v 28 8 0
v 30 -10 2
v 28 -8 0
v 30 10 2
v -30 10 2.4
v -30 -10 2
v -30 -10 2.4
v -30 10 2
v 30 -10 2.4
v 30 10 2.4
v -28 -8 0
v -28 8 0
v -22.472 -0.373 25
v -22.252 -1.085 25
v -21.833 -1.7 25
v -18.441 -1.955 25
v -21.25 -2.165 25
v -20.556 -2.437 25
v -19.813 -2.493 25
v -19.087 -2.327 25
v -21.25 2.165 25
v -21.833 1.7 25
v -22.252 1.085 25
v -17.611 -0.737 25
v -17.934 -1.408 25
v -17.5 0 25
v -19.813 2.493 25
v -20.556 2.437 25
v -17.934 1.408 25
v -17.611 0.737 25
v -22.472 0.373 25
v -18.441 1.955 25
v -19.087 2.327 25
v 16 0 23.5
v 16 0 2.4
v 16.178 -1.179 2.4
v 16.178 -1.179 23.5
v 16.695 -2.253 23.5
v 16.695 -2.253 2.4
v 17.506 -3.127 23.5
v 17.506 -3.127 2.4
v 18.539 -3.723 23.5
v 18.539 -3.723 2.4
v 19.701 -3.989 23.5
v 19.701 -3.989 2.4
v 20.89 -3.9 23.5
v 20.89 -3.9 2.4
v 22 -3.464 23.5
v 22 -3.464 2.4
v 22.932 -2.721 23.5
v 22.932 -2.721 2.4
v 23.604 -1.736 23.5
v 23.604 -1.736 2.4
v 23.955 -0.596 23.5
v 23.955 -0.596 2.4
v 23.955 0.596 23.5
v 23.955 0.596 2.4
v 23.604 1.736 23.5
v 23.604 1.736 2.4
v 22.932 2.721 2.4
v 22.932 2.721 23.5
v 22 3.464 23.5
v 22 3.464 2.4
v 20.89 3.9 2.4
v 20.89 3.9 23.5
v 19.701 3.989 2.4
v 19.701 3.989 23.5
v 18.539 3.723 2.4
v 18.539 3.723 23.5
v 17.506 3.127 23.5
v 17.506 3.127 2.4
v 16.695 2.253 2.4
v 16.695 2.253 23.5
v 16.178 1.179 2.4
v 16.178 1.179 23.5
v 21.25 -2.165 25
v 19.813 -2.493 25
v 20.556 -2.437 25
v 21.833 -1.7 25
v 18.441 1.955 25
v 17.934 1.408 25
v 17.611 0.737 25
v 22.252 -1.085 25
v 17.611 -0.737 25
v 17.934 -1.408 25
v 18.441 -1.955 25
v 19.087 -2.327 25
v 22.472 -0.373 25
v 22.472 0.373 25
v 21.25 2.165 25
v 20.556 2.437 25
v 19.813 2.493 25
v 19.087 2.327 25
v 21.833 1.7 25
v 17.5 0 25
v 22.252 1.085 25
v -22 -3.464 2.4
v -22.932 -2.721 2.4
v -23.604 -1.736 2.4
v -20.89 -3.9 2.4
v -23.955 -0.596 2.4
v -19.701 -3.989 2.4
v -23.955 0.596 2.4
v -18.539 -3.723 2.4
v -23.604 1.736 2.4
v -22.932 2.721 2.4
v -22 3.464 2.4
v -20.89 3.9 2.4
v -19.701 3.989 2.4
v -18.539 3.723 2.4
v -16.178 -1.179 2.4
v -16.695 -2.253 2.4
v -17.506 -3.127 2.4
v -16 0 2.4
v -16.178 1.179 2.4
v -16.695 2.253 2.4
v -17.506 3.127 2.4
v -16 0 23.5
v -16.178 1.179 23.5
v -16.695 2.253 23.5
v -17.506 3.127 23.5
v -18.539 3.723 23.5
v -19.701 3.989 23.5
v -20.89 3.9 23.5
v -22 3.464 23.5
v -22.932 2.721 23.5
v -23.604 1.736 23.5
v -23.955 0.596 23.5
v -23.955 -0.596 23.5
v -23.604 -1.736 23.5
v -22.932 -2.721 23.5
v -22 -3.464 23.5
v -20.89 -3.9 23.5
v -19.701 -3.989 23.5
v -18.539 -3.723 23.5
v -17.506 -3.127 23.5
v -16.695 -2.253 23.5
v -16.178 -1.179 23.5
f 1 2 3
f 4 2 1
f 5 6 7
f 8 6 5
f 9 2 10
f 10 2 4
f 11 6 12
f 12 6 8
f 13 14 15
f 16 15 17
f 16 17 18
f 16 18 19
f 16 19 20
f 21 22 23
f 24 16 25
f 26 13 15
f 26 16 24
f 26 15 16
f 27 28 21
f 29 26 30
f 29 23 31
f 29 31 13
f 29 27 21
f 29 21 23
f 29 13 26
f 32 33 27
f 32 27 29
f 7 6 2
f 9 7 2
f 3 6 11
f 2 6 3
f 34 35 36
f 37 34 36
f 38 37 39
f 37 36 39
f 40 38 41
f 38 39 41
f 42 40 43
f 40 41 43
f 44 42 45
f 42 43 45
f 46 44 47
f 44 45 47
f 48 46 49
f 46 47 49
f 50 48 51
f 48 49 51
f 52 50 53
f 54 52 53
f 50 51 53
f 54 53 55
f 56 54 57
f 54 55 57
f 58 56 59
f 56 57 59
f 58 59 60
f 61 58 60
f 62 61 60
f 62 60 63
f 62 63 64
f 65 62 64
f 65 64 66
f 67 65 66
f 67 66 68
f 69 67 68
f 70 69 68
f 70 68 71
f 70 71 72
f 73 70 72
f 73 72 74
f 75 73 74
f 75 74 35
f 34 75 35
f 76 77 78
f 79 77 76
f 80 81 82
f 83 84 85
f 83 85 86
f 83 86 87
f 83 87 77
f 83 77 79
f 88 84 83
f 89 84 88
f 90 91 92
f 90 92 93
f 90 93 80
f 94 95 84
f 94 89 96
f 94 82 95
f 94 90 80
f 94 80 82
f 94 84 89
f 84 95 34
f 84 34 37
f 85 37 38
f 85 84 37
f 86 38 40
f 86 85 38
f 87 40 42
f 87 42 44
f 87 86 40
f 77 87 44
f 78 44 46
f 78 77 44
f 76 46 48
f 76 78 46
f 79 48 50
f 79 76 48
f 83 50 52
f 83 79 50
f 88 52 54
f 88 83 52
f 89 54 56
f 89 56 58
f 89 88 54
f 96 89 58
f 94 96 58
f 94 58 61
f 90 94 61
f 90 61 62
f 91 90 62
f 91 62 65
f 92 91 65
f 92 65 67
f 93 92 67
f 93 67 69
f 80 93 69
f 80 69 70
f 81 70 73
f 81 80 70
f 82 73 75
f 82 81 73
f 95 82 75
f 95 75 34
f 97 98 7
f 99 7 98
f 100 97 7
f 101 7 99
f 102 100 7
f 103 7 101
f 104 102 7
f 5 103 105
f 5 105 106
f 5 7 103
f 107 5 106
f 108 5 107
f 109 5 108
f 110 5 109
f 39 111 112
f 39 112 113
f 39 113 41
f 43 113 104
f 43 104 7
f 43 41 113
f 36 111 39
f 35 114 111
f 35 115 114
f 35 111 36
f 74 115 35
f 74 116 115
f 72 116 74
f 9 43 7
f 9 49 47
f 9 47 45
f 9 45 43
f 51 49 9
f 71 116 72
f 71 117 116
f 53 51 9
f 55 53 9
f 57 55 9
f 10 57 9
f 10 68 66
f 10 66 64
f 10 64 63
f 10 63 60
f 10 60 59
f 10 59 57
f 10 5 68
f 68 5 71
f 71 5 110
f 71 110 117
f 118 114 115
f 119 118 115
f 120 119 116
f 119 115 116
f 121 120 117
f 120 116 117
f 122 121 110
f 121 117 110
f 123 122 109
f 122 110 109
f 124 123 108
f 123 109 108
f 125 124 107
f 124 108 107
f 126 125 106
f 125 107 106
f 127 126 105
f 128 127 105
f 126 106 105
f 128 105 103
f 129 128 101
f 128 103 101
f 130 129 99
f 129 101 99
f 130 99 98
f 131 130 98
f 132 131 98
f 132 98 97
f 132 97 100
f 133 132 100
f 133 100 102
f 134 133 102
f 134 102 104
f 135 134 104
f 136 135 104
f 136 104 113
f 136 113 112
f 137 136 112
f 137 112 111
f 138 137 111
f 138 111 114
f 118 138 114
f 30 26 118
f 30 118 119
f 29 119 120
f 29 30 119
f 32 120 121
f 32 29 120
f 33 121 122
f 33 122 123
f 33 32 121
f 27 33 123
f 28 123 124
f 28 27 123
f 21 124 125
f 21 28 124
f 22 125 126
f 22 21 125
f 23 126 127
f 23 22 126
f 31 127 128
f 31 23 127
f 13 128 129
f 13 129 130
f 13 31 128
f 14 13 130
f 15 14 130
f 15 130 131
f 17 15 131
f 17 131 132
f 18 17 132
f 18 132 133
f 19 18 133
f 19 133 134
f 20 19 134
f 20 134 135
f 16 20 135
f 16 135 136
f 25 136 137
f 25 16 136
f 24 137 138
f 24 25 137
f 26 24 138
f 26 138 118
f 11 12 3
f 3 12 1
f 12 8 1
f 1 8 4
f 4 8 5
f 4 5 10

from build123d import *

# Parameters (mm, degrees)
F0_W     = 60
F0_H     = 20
F0_R     = 4
F1_DEPTH = 2.4
F2_DEPTH = 25
F3_SIZE  = 2
F4_SIZE  = 1.5


with BuildPart() as f1:
    # F0 (on Top) → F1 (new body)
    with BuildSketch(Plane.XY):
        Rectangle(F0_W, F0_H)
        with Locations((-20, 0)):
            Circle(F0_R, mode=Mode.SUBTRACT)
        with BuildLine():
            ThreePointArc((24, 0), (20, -4), (16, 0))
            ThreePointArc((16, 0), (20, 4), (24, 0))
        make_face(mode=Mode.SUBTRACT)
        with Locations((-20, 0)):
            Circle(F0_R)
        with BuildLine():
            ThreePointArc((24, 0), (20, 4), (16, 0))
            ThreePointArc((16, 0), (20, -4), (24, 0))
        make_face()
    extrude(amount=F1_DEPTH)

    # F0 (on Top) → F2 (join)
    with BuildSketch(Plane.XY):
        with Locations((-20, 0)):
            Circle(F0_R)
        with BuildLine():
            ThreePointArc((24, 0), (20, 4), (16, 0))
            ThreePointArc((16, 0), (20, -4), (24, 0))
        make_face()
    extrude(amount=F2_DEPTH)

    # F3
    f3_edges = [f1.edges().sort_by_distance(p)[0] for p in [
        (0, -10, 0),
        (30, 0, 0),
        (0, 10, 0),
        (-30, 0, 0),
    ]]
    chamfer(f3_edges, length=F3_SIZE)

    # F4
    f4_edges = [f1.edges().sort_by_distance(p)[0] for p in [
        (-24, 0, 25),
        (24, 0, 25),
    ]]
    chamfer(f4_edges, length=F4_SIZE)


solid = f1.part
